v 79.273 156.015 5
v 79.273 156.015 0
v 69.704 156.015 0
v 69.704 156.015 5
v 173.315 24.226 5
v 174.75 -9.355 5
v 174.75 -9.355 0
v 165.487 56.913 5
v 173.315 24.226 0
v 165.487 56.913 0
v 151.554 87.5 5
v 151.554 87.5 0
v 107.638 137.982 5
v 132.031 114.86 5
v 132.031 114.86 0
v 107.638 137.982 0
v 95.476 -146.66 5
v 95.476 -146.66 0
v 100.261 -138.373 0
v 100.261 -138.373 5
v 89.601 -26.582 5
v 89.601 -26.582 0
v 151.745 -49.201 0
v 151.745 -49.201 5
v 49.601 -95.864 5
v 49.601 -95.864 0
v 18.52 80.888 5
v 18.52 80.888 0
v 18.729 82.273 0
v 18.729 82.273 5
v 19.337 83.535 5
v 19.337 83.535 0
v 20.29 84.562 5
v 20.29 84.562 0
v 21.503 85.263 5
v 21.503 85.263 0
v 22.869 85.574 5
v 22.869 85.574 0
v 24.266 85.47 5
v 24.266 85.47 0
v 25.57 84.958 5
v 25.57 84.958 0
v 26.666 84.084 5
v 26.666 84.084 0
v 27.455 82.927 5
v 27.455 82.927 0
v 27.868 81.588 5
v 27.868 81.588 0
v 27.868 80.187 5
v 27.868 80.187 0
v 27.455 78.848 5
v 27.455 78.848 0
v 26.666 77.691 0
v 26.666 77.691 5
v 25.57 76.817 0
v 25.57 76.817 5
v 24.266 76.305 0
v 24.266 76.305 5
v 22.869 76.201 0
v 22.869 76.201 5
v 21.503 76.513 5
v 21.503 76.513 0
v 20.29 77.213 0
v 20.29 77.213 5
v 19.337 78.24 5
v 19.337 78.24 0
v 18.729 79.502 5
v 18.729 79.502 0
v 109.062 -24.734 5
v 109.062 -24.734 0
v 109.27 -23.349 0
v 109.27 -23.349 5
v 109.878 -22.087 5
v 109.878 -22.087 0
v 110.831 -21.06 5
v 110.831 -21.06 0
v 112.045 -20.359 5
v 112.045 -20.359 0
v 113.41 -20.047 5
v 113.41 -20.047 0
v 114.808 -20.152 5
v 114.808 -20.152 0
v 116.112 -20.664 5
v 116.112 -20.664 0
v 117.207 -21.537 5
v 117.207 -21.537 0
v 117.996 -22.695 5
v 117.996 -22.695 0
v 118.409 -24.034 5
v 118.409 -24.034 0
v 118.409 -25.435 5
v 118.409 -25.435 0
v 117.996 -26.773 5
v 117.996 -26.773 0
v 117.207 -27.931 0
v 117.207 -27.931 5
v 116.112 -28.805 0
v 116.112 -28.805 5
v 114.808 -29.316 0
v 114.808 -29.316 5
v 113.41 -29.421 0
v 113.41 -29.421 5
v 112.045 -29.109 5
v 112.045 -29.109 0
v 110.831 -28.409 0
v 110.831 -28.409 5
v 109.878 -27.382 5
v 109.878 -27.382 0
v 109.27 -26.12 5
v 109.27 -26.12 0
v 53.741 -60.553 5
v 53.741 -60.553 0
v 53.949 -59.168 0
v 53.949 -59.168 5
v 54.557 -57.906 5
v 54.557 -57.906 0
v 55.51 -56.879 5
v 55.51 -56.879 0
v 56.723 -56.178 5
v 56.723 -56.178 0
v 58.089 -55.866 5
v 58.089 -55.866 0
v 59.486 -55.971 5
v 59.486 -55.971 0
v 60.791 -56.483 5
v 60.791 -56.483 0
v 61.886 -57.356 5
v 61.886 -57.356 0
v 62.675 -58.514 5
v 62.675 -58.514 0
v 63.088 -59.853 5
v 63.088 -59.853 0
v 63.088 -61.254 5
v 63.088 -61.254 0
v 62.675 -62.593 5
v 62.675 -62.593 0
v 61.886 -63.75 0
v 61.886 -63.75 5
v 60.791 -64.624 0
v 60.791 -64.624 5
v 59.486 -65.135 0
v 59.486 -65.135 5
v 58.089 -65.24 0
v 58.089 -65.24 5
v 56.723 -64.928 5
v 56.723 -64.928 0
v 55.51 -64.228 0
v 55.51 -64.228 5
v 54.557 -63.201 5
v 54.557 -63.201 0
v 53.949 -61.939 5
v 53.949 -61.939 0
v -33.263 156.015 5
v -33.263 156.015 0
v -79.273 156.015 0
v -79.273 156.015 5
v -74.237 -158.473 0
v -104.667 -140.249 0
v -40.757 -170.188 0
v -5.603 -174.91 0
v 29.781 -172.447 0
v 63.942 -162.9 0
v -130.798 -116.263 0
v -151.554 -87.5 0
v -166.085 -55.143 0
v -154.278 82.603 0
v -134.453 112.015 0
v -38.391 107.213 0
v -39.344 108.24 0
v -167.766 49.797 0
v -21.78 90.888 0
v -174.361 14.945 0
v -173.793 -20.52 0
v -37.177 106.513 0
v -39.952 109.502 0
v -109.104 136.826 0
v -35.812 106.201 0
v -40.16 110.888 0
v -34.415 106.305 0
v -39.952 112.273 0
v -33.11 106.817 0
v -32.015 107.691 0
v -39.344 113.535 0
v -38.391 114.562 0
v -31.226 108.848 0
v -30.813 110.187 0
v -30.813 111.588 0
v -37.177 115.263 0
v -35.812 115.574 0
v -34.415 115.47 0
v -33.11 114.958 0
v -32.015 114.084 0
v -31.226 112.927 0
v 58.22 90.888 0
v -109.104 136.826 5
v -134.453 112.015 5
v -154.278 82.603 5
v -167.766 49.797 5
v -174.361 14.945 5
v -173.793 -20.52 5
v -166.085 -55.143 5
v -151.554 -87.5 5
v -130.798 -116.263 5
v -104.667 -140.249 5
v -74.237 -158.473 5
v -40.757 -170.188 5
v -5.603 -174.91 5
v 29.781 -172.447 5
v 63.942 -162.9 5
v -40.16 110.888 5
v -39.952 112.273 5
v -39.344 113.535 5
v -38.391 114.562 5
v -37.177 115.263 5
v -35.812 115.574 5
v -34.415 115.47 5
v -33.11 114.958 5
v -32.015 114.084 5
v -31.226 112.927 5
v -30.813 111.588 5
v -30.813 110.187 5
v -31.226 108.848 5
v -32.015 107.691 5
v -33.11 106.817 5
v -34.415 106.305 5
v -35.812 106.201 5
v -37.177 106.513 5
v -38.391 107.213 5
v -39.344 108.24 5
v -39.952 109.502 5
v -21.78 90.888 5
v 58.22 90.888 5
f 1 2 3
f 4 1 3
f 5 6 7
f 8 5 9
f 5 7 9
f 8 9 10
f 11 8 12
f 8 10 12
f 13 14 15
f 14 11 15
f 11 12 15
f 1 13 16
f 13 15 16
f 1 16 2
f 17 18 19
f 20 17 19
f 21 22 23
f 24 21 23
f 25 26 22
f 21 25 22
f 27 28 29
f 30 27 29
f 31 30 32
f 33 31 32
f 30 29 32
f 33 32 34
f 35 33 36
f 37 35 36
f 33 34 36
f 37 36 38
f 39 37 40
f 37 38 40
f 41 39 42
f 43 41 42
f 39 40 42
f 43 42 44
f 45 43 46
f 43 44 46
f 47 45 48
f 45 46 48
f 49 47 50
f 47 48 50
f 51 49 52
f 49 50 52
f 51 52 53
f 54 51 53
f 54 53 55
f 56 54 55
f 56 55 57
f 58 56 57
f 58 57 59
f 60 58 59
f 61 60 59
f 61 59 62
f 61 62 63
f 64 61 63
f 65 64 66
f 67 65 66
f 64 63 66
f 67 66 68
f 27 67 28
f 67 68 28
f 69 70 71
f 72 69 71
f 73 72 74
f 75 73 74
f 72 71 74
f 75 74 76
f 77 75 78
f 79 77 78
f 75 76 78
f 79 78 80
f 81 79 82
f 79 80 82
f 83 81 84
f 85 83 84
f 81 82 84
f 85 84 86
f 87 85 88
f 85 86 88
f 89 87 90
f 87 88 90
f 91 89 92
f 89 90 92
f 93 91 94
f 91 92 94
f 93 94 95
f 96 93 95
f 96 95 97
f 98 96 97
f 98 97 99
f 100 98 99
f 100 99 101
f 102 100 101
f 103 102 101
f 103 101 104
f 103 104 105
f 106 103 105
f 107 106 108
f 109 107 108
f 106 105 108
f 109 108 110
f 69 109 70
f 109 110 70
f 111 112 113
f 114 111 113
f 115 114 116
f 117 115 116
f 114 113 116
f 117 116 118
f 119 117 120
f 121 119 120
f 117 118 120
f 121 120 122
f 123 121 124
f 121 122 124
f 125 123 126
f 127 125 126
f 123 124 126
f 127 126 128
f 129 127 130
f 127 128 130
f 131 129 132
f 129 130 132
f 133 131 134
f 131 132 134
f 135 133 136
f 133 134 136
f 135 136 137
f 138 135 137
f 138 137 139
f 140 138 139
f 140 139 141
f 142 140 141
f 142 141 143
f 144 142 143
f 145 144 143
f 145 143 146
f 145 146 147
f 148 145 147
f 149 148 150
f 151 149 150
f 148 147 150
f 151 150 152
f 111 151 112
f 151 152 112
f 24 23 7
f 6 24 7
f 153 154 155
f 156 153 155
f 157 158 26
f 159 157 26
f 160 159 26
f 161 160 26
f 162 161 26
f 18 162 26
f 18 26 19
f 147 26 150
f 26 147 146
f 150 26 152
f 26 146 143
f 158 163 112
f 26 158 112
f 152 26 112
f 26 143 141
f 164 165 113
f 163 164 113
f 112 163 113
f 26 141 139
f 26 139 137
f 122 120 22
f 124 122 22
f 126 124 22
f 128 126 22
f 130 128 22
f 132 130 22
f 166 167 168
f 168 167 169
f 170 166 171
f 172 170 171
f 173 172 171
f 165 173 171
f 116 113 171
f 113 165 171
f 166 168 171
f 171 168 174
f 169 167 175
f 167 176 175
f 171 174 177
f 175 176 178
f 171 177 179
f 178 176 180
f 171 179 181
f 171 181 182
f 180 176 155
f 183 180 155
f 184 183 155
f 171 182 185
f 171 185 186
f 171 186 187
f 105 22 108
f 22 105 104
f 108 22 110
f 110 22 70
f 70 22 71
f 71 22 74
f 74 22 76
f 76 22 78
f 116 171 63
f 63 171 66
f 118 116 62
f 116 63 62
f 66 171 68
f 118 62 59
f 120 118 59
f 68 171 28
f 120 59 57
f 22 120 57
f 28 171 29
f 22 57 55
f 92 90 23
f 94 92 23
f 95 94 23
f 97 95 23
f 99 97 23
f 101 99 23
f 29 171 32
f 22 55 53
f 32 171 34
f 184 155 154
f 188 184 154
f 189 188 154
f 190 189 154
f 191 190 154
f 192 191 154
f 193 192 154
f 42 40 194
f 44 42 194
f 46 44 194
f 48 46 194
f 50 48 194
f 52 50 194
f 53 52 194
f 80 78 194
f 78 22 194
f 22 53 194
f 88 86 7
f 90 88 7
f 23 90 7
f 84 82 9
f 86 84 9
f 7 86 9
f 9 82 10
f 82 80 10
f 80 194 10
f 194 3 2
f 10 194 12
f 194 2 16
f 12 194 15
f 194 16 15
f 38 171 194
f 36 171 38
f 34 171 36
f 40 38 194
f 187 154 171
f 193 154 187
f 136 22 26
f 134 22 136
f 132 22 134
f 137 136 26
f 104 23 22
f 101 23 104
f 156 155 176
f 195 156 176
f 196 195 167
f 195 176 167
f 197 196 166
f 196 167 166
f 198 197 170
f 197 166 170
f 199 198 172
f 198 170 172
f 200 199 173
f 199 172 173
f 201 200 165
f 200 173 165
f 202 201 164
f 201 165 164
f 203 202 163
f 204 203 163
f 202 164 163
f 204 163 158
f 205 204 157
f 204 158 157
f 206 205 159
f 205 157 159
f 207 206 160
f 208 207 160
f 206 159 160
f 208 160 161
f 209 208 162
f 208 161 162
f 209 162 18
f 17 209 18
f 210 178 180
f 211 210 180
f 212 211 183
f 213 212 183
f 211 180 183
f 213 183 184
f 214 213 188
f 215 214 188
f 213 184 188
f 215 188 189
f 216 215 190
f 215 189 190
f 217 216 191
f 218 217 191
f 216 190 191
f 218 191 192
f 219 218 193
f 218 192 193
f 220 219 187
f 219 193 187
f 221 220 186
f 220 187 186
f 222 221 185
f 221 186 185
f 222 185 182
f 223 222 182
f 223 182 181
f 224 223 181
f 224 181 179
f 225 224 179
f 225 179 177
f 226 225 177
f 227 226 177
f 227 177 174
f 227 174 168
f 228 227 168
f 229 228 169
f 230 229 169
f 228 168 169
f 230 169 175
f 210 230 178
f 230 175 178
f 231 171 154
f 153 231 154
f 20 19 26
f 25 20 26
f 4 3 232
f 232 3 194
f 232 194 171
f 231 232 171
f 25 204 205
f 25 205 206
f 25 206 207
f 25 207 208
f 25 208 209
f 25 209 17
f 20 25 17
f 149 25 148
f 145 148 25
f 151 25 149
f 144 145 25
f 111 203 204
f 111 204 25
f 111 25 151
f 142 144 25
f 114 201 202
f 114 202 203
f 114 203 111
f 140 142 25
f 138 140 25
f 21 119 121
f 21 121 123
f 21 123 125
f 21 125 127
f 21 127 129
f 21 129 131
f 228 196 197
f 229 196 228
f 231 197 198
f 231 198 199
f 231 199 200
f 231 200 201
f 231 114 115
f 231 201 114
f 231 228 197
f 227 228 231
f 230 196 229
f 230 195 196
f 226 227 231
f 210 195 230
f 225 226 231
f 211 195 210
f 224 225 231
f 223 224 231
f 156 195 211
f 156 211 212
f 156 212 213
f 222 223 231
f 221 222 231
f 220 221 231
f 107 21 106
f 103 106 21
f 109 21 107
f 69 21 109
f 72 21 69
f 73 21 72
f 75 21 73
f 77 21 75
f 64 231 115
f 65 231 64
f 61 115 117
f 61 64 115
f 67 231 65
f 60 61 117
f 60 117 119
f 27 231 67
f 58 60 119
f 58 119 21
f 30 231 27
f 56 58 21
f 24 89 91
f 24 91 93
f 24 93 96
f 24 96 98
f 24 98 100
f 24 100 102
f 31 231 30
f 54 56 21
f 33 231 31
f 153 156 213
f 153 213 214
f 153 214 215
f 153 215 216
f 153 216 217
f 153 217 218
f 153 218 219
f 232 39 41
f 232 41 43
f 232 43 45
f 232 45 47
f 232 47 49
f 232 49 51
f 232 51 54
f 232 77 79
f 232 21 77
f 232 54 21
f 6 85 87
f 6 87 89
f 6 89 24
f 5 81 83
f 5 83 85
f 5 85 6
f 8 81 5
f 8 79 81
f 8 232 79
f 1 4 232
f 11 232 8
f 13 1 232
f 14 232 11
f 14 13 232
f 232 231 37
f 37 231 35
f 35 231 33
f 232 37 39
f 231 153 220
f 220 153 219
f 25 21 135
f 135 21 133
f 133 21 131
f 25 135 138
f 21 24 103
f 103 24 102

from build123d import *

# Parameters (mm, degrees)
ESQUISSE1_R             = 175
BOSS_EXTRU_1_DEPTH      = 5
ESQUISSE2_R             = 4.7
ENL_V_MAT_EXTRU_1_DEPTH = 5


with BuildPart() as part:
    # Esquisse1 → Boss.-Extru.1 (new body)
    with BuildSketch(Plane.XY):
        Circle(ESQUISSE1_R)
    extrude(amount=BOSS_EXTRU_1_DEPTH)

    # Esquisse2 → Enlèv. mat.-Extru.1 (cut)
    with BuildSketch(Plane(origin=(0, 0, 0), x_dir=(-1, 0, 0), z_dir=(0, 0, -1))):
        with Locations((-23.220426897, 80.887612711)):
            Circle(ESQUISSE2_R)
        with Locations((35.460378836, 110.887612711)):
            Circle(ESQUISSE2_R)
        with Locations((-58.440514011, -60.553285934)):
            Circle(ESQUISSE2_R)
        with Locations((-113.761678991, -24.734217455)):
            Circle(ESQUISSE2_R)
        Polygon((21.779573103, 90.887612711), (33.263317057, 156.015161015), (79.273384773, 156.015161015), (79.273384773, 185.246123659), (-115.714238566, 185.246123659), (-115.714238566, 156.015161015), (-69.70417085, 156.015161015), (-58.220426897, 90.887612711), align=None)
        Polygon((-89.600768048, -26.582142764), (-151.744751343, -49.200702922), (-174.749785201, -9.35481545), (-200.064541428, -23.970296772), (-102.570729758, -192.834532007), (-77.255973531, -178.219050686), (-100.26100739, -138.373163213), (-49.600768048, -95.864175067), align=None)
    extrude(amount=-ENL_V_MAT_EXTRU_1_DEPTH, mode=Mode.SUBTRACT)


solid = part.part
